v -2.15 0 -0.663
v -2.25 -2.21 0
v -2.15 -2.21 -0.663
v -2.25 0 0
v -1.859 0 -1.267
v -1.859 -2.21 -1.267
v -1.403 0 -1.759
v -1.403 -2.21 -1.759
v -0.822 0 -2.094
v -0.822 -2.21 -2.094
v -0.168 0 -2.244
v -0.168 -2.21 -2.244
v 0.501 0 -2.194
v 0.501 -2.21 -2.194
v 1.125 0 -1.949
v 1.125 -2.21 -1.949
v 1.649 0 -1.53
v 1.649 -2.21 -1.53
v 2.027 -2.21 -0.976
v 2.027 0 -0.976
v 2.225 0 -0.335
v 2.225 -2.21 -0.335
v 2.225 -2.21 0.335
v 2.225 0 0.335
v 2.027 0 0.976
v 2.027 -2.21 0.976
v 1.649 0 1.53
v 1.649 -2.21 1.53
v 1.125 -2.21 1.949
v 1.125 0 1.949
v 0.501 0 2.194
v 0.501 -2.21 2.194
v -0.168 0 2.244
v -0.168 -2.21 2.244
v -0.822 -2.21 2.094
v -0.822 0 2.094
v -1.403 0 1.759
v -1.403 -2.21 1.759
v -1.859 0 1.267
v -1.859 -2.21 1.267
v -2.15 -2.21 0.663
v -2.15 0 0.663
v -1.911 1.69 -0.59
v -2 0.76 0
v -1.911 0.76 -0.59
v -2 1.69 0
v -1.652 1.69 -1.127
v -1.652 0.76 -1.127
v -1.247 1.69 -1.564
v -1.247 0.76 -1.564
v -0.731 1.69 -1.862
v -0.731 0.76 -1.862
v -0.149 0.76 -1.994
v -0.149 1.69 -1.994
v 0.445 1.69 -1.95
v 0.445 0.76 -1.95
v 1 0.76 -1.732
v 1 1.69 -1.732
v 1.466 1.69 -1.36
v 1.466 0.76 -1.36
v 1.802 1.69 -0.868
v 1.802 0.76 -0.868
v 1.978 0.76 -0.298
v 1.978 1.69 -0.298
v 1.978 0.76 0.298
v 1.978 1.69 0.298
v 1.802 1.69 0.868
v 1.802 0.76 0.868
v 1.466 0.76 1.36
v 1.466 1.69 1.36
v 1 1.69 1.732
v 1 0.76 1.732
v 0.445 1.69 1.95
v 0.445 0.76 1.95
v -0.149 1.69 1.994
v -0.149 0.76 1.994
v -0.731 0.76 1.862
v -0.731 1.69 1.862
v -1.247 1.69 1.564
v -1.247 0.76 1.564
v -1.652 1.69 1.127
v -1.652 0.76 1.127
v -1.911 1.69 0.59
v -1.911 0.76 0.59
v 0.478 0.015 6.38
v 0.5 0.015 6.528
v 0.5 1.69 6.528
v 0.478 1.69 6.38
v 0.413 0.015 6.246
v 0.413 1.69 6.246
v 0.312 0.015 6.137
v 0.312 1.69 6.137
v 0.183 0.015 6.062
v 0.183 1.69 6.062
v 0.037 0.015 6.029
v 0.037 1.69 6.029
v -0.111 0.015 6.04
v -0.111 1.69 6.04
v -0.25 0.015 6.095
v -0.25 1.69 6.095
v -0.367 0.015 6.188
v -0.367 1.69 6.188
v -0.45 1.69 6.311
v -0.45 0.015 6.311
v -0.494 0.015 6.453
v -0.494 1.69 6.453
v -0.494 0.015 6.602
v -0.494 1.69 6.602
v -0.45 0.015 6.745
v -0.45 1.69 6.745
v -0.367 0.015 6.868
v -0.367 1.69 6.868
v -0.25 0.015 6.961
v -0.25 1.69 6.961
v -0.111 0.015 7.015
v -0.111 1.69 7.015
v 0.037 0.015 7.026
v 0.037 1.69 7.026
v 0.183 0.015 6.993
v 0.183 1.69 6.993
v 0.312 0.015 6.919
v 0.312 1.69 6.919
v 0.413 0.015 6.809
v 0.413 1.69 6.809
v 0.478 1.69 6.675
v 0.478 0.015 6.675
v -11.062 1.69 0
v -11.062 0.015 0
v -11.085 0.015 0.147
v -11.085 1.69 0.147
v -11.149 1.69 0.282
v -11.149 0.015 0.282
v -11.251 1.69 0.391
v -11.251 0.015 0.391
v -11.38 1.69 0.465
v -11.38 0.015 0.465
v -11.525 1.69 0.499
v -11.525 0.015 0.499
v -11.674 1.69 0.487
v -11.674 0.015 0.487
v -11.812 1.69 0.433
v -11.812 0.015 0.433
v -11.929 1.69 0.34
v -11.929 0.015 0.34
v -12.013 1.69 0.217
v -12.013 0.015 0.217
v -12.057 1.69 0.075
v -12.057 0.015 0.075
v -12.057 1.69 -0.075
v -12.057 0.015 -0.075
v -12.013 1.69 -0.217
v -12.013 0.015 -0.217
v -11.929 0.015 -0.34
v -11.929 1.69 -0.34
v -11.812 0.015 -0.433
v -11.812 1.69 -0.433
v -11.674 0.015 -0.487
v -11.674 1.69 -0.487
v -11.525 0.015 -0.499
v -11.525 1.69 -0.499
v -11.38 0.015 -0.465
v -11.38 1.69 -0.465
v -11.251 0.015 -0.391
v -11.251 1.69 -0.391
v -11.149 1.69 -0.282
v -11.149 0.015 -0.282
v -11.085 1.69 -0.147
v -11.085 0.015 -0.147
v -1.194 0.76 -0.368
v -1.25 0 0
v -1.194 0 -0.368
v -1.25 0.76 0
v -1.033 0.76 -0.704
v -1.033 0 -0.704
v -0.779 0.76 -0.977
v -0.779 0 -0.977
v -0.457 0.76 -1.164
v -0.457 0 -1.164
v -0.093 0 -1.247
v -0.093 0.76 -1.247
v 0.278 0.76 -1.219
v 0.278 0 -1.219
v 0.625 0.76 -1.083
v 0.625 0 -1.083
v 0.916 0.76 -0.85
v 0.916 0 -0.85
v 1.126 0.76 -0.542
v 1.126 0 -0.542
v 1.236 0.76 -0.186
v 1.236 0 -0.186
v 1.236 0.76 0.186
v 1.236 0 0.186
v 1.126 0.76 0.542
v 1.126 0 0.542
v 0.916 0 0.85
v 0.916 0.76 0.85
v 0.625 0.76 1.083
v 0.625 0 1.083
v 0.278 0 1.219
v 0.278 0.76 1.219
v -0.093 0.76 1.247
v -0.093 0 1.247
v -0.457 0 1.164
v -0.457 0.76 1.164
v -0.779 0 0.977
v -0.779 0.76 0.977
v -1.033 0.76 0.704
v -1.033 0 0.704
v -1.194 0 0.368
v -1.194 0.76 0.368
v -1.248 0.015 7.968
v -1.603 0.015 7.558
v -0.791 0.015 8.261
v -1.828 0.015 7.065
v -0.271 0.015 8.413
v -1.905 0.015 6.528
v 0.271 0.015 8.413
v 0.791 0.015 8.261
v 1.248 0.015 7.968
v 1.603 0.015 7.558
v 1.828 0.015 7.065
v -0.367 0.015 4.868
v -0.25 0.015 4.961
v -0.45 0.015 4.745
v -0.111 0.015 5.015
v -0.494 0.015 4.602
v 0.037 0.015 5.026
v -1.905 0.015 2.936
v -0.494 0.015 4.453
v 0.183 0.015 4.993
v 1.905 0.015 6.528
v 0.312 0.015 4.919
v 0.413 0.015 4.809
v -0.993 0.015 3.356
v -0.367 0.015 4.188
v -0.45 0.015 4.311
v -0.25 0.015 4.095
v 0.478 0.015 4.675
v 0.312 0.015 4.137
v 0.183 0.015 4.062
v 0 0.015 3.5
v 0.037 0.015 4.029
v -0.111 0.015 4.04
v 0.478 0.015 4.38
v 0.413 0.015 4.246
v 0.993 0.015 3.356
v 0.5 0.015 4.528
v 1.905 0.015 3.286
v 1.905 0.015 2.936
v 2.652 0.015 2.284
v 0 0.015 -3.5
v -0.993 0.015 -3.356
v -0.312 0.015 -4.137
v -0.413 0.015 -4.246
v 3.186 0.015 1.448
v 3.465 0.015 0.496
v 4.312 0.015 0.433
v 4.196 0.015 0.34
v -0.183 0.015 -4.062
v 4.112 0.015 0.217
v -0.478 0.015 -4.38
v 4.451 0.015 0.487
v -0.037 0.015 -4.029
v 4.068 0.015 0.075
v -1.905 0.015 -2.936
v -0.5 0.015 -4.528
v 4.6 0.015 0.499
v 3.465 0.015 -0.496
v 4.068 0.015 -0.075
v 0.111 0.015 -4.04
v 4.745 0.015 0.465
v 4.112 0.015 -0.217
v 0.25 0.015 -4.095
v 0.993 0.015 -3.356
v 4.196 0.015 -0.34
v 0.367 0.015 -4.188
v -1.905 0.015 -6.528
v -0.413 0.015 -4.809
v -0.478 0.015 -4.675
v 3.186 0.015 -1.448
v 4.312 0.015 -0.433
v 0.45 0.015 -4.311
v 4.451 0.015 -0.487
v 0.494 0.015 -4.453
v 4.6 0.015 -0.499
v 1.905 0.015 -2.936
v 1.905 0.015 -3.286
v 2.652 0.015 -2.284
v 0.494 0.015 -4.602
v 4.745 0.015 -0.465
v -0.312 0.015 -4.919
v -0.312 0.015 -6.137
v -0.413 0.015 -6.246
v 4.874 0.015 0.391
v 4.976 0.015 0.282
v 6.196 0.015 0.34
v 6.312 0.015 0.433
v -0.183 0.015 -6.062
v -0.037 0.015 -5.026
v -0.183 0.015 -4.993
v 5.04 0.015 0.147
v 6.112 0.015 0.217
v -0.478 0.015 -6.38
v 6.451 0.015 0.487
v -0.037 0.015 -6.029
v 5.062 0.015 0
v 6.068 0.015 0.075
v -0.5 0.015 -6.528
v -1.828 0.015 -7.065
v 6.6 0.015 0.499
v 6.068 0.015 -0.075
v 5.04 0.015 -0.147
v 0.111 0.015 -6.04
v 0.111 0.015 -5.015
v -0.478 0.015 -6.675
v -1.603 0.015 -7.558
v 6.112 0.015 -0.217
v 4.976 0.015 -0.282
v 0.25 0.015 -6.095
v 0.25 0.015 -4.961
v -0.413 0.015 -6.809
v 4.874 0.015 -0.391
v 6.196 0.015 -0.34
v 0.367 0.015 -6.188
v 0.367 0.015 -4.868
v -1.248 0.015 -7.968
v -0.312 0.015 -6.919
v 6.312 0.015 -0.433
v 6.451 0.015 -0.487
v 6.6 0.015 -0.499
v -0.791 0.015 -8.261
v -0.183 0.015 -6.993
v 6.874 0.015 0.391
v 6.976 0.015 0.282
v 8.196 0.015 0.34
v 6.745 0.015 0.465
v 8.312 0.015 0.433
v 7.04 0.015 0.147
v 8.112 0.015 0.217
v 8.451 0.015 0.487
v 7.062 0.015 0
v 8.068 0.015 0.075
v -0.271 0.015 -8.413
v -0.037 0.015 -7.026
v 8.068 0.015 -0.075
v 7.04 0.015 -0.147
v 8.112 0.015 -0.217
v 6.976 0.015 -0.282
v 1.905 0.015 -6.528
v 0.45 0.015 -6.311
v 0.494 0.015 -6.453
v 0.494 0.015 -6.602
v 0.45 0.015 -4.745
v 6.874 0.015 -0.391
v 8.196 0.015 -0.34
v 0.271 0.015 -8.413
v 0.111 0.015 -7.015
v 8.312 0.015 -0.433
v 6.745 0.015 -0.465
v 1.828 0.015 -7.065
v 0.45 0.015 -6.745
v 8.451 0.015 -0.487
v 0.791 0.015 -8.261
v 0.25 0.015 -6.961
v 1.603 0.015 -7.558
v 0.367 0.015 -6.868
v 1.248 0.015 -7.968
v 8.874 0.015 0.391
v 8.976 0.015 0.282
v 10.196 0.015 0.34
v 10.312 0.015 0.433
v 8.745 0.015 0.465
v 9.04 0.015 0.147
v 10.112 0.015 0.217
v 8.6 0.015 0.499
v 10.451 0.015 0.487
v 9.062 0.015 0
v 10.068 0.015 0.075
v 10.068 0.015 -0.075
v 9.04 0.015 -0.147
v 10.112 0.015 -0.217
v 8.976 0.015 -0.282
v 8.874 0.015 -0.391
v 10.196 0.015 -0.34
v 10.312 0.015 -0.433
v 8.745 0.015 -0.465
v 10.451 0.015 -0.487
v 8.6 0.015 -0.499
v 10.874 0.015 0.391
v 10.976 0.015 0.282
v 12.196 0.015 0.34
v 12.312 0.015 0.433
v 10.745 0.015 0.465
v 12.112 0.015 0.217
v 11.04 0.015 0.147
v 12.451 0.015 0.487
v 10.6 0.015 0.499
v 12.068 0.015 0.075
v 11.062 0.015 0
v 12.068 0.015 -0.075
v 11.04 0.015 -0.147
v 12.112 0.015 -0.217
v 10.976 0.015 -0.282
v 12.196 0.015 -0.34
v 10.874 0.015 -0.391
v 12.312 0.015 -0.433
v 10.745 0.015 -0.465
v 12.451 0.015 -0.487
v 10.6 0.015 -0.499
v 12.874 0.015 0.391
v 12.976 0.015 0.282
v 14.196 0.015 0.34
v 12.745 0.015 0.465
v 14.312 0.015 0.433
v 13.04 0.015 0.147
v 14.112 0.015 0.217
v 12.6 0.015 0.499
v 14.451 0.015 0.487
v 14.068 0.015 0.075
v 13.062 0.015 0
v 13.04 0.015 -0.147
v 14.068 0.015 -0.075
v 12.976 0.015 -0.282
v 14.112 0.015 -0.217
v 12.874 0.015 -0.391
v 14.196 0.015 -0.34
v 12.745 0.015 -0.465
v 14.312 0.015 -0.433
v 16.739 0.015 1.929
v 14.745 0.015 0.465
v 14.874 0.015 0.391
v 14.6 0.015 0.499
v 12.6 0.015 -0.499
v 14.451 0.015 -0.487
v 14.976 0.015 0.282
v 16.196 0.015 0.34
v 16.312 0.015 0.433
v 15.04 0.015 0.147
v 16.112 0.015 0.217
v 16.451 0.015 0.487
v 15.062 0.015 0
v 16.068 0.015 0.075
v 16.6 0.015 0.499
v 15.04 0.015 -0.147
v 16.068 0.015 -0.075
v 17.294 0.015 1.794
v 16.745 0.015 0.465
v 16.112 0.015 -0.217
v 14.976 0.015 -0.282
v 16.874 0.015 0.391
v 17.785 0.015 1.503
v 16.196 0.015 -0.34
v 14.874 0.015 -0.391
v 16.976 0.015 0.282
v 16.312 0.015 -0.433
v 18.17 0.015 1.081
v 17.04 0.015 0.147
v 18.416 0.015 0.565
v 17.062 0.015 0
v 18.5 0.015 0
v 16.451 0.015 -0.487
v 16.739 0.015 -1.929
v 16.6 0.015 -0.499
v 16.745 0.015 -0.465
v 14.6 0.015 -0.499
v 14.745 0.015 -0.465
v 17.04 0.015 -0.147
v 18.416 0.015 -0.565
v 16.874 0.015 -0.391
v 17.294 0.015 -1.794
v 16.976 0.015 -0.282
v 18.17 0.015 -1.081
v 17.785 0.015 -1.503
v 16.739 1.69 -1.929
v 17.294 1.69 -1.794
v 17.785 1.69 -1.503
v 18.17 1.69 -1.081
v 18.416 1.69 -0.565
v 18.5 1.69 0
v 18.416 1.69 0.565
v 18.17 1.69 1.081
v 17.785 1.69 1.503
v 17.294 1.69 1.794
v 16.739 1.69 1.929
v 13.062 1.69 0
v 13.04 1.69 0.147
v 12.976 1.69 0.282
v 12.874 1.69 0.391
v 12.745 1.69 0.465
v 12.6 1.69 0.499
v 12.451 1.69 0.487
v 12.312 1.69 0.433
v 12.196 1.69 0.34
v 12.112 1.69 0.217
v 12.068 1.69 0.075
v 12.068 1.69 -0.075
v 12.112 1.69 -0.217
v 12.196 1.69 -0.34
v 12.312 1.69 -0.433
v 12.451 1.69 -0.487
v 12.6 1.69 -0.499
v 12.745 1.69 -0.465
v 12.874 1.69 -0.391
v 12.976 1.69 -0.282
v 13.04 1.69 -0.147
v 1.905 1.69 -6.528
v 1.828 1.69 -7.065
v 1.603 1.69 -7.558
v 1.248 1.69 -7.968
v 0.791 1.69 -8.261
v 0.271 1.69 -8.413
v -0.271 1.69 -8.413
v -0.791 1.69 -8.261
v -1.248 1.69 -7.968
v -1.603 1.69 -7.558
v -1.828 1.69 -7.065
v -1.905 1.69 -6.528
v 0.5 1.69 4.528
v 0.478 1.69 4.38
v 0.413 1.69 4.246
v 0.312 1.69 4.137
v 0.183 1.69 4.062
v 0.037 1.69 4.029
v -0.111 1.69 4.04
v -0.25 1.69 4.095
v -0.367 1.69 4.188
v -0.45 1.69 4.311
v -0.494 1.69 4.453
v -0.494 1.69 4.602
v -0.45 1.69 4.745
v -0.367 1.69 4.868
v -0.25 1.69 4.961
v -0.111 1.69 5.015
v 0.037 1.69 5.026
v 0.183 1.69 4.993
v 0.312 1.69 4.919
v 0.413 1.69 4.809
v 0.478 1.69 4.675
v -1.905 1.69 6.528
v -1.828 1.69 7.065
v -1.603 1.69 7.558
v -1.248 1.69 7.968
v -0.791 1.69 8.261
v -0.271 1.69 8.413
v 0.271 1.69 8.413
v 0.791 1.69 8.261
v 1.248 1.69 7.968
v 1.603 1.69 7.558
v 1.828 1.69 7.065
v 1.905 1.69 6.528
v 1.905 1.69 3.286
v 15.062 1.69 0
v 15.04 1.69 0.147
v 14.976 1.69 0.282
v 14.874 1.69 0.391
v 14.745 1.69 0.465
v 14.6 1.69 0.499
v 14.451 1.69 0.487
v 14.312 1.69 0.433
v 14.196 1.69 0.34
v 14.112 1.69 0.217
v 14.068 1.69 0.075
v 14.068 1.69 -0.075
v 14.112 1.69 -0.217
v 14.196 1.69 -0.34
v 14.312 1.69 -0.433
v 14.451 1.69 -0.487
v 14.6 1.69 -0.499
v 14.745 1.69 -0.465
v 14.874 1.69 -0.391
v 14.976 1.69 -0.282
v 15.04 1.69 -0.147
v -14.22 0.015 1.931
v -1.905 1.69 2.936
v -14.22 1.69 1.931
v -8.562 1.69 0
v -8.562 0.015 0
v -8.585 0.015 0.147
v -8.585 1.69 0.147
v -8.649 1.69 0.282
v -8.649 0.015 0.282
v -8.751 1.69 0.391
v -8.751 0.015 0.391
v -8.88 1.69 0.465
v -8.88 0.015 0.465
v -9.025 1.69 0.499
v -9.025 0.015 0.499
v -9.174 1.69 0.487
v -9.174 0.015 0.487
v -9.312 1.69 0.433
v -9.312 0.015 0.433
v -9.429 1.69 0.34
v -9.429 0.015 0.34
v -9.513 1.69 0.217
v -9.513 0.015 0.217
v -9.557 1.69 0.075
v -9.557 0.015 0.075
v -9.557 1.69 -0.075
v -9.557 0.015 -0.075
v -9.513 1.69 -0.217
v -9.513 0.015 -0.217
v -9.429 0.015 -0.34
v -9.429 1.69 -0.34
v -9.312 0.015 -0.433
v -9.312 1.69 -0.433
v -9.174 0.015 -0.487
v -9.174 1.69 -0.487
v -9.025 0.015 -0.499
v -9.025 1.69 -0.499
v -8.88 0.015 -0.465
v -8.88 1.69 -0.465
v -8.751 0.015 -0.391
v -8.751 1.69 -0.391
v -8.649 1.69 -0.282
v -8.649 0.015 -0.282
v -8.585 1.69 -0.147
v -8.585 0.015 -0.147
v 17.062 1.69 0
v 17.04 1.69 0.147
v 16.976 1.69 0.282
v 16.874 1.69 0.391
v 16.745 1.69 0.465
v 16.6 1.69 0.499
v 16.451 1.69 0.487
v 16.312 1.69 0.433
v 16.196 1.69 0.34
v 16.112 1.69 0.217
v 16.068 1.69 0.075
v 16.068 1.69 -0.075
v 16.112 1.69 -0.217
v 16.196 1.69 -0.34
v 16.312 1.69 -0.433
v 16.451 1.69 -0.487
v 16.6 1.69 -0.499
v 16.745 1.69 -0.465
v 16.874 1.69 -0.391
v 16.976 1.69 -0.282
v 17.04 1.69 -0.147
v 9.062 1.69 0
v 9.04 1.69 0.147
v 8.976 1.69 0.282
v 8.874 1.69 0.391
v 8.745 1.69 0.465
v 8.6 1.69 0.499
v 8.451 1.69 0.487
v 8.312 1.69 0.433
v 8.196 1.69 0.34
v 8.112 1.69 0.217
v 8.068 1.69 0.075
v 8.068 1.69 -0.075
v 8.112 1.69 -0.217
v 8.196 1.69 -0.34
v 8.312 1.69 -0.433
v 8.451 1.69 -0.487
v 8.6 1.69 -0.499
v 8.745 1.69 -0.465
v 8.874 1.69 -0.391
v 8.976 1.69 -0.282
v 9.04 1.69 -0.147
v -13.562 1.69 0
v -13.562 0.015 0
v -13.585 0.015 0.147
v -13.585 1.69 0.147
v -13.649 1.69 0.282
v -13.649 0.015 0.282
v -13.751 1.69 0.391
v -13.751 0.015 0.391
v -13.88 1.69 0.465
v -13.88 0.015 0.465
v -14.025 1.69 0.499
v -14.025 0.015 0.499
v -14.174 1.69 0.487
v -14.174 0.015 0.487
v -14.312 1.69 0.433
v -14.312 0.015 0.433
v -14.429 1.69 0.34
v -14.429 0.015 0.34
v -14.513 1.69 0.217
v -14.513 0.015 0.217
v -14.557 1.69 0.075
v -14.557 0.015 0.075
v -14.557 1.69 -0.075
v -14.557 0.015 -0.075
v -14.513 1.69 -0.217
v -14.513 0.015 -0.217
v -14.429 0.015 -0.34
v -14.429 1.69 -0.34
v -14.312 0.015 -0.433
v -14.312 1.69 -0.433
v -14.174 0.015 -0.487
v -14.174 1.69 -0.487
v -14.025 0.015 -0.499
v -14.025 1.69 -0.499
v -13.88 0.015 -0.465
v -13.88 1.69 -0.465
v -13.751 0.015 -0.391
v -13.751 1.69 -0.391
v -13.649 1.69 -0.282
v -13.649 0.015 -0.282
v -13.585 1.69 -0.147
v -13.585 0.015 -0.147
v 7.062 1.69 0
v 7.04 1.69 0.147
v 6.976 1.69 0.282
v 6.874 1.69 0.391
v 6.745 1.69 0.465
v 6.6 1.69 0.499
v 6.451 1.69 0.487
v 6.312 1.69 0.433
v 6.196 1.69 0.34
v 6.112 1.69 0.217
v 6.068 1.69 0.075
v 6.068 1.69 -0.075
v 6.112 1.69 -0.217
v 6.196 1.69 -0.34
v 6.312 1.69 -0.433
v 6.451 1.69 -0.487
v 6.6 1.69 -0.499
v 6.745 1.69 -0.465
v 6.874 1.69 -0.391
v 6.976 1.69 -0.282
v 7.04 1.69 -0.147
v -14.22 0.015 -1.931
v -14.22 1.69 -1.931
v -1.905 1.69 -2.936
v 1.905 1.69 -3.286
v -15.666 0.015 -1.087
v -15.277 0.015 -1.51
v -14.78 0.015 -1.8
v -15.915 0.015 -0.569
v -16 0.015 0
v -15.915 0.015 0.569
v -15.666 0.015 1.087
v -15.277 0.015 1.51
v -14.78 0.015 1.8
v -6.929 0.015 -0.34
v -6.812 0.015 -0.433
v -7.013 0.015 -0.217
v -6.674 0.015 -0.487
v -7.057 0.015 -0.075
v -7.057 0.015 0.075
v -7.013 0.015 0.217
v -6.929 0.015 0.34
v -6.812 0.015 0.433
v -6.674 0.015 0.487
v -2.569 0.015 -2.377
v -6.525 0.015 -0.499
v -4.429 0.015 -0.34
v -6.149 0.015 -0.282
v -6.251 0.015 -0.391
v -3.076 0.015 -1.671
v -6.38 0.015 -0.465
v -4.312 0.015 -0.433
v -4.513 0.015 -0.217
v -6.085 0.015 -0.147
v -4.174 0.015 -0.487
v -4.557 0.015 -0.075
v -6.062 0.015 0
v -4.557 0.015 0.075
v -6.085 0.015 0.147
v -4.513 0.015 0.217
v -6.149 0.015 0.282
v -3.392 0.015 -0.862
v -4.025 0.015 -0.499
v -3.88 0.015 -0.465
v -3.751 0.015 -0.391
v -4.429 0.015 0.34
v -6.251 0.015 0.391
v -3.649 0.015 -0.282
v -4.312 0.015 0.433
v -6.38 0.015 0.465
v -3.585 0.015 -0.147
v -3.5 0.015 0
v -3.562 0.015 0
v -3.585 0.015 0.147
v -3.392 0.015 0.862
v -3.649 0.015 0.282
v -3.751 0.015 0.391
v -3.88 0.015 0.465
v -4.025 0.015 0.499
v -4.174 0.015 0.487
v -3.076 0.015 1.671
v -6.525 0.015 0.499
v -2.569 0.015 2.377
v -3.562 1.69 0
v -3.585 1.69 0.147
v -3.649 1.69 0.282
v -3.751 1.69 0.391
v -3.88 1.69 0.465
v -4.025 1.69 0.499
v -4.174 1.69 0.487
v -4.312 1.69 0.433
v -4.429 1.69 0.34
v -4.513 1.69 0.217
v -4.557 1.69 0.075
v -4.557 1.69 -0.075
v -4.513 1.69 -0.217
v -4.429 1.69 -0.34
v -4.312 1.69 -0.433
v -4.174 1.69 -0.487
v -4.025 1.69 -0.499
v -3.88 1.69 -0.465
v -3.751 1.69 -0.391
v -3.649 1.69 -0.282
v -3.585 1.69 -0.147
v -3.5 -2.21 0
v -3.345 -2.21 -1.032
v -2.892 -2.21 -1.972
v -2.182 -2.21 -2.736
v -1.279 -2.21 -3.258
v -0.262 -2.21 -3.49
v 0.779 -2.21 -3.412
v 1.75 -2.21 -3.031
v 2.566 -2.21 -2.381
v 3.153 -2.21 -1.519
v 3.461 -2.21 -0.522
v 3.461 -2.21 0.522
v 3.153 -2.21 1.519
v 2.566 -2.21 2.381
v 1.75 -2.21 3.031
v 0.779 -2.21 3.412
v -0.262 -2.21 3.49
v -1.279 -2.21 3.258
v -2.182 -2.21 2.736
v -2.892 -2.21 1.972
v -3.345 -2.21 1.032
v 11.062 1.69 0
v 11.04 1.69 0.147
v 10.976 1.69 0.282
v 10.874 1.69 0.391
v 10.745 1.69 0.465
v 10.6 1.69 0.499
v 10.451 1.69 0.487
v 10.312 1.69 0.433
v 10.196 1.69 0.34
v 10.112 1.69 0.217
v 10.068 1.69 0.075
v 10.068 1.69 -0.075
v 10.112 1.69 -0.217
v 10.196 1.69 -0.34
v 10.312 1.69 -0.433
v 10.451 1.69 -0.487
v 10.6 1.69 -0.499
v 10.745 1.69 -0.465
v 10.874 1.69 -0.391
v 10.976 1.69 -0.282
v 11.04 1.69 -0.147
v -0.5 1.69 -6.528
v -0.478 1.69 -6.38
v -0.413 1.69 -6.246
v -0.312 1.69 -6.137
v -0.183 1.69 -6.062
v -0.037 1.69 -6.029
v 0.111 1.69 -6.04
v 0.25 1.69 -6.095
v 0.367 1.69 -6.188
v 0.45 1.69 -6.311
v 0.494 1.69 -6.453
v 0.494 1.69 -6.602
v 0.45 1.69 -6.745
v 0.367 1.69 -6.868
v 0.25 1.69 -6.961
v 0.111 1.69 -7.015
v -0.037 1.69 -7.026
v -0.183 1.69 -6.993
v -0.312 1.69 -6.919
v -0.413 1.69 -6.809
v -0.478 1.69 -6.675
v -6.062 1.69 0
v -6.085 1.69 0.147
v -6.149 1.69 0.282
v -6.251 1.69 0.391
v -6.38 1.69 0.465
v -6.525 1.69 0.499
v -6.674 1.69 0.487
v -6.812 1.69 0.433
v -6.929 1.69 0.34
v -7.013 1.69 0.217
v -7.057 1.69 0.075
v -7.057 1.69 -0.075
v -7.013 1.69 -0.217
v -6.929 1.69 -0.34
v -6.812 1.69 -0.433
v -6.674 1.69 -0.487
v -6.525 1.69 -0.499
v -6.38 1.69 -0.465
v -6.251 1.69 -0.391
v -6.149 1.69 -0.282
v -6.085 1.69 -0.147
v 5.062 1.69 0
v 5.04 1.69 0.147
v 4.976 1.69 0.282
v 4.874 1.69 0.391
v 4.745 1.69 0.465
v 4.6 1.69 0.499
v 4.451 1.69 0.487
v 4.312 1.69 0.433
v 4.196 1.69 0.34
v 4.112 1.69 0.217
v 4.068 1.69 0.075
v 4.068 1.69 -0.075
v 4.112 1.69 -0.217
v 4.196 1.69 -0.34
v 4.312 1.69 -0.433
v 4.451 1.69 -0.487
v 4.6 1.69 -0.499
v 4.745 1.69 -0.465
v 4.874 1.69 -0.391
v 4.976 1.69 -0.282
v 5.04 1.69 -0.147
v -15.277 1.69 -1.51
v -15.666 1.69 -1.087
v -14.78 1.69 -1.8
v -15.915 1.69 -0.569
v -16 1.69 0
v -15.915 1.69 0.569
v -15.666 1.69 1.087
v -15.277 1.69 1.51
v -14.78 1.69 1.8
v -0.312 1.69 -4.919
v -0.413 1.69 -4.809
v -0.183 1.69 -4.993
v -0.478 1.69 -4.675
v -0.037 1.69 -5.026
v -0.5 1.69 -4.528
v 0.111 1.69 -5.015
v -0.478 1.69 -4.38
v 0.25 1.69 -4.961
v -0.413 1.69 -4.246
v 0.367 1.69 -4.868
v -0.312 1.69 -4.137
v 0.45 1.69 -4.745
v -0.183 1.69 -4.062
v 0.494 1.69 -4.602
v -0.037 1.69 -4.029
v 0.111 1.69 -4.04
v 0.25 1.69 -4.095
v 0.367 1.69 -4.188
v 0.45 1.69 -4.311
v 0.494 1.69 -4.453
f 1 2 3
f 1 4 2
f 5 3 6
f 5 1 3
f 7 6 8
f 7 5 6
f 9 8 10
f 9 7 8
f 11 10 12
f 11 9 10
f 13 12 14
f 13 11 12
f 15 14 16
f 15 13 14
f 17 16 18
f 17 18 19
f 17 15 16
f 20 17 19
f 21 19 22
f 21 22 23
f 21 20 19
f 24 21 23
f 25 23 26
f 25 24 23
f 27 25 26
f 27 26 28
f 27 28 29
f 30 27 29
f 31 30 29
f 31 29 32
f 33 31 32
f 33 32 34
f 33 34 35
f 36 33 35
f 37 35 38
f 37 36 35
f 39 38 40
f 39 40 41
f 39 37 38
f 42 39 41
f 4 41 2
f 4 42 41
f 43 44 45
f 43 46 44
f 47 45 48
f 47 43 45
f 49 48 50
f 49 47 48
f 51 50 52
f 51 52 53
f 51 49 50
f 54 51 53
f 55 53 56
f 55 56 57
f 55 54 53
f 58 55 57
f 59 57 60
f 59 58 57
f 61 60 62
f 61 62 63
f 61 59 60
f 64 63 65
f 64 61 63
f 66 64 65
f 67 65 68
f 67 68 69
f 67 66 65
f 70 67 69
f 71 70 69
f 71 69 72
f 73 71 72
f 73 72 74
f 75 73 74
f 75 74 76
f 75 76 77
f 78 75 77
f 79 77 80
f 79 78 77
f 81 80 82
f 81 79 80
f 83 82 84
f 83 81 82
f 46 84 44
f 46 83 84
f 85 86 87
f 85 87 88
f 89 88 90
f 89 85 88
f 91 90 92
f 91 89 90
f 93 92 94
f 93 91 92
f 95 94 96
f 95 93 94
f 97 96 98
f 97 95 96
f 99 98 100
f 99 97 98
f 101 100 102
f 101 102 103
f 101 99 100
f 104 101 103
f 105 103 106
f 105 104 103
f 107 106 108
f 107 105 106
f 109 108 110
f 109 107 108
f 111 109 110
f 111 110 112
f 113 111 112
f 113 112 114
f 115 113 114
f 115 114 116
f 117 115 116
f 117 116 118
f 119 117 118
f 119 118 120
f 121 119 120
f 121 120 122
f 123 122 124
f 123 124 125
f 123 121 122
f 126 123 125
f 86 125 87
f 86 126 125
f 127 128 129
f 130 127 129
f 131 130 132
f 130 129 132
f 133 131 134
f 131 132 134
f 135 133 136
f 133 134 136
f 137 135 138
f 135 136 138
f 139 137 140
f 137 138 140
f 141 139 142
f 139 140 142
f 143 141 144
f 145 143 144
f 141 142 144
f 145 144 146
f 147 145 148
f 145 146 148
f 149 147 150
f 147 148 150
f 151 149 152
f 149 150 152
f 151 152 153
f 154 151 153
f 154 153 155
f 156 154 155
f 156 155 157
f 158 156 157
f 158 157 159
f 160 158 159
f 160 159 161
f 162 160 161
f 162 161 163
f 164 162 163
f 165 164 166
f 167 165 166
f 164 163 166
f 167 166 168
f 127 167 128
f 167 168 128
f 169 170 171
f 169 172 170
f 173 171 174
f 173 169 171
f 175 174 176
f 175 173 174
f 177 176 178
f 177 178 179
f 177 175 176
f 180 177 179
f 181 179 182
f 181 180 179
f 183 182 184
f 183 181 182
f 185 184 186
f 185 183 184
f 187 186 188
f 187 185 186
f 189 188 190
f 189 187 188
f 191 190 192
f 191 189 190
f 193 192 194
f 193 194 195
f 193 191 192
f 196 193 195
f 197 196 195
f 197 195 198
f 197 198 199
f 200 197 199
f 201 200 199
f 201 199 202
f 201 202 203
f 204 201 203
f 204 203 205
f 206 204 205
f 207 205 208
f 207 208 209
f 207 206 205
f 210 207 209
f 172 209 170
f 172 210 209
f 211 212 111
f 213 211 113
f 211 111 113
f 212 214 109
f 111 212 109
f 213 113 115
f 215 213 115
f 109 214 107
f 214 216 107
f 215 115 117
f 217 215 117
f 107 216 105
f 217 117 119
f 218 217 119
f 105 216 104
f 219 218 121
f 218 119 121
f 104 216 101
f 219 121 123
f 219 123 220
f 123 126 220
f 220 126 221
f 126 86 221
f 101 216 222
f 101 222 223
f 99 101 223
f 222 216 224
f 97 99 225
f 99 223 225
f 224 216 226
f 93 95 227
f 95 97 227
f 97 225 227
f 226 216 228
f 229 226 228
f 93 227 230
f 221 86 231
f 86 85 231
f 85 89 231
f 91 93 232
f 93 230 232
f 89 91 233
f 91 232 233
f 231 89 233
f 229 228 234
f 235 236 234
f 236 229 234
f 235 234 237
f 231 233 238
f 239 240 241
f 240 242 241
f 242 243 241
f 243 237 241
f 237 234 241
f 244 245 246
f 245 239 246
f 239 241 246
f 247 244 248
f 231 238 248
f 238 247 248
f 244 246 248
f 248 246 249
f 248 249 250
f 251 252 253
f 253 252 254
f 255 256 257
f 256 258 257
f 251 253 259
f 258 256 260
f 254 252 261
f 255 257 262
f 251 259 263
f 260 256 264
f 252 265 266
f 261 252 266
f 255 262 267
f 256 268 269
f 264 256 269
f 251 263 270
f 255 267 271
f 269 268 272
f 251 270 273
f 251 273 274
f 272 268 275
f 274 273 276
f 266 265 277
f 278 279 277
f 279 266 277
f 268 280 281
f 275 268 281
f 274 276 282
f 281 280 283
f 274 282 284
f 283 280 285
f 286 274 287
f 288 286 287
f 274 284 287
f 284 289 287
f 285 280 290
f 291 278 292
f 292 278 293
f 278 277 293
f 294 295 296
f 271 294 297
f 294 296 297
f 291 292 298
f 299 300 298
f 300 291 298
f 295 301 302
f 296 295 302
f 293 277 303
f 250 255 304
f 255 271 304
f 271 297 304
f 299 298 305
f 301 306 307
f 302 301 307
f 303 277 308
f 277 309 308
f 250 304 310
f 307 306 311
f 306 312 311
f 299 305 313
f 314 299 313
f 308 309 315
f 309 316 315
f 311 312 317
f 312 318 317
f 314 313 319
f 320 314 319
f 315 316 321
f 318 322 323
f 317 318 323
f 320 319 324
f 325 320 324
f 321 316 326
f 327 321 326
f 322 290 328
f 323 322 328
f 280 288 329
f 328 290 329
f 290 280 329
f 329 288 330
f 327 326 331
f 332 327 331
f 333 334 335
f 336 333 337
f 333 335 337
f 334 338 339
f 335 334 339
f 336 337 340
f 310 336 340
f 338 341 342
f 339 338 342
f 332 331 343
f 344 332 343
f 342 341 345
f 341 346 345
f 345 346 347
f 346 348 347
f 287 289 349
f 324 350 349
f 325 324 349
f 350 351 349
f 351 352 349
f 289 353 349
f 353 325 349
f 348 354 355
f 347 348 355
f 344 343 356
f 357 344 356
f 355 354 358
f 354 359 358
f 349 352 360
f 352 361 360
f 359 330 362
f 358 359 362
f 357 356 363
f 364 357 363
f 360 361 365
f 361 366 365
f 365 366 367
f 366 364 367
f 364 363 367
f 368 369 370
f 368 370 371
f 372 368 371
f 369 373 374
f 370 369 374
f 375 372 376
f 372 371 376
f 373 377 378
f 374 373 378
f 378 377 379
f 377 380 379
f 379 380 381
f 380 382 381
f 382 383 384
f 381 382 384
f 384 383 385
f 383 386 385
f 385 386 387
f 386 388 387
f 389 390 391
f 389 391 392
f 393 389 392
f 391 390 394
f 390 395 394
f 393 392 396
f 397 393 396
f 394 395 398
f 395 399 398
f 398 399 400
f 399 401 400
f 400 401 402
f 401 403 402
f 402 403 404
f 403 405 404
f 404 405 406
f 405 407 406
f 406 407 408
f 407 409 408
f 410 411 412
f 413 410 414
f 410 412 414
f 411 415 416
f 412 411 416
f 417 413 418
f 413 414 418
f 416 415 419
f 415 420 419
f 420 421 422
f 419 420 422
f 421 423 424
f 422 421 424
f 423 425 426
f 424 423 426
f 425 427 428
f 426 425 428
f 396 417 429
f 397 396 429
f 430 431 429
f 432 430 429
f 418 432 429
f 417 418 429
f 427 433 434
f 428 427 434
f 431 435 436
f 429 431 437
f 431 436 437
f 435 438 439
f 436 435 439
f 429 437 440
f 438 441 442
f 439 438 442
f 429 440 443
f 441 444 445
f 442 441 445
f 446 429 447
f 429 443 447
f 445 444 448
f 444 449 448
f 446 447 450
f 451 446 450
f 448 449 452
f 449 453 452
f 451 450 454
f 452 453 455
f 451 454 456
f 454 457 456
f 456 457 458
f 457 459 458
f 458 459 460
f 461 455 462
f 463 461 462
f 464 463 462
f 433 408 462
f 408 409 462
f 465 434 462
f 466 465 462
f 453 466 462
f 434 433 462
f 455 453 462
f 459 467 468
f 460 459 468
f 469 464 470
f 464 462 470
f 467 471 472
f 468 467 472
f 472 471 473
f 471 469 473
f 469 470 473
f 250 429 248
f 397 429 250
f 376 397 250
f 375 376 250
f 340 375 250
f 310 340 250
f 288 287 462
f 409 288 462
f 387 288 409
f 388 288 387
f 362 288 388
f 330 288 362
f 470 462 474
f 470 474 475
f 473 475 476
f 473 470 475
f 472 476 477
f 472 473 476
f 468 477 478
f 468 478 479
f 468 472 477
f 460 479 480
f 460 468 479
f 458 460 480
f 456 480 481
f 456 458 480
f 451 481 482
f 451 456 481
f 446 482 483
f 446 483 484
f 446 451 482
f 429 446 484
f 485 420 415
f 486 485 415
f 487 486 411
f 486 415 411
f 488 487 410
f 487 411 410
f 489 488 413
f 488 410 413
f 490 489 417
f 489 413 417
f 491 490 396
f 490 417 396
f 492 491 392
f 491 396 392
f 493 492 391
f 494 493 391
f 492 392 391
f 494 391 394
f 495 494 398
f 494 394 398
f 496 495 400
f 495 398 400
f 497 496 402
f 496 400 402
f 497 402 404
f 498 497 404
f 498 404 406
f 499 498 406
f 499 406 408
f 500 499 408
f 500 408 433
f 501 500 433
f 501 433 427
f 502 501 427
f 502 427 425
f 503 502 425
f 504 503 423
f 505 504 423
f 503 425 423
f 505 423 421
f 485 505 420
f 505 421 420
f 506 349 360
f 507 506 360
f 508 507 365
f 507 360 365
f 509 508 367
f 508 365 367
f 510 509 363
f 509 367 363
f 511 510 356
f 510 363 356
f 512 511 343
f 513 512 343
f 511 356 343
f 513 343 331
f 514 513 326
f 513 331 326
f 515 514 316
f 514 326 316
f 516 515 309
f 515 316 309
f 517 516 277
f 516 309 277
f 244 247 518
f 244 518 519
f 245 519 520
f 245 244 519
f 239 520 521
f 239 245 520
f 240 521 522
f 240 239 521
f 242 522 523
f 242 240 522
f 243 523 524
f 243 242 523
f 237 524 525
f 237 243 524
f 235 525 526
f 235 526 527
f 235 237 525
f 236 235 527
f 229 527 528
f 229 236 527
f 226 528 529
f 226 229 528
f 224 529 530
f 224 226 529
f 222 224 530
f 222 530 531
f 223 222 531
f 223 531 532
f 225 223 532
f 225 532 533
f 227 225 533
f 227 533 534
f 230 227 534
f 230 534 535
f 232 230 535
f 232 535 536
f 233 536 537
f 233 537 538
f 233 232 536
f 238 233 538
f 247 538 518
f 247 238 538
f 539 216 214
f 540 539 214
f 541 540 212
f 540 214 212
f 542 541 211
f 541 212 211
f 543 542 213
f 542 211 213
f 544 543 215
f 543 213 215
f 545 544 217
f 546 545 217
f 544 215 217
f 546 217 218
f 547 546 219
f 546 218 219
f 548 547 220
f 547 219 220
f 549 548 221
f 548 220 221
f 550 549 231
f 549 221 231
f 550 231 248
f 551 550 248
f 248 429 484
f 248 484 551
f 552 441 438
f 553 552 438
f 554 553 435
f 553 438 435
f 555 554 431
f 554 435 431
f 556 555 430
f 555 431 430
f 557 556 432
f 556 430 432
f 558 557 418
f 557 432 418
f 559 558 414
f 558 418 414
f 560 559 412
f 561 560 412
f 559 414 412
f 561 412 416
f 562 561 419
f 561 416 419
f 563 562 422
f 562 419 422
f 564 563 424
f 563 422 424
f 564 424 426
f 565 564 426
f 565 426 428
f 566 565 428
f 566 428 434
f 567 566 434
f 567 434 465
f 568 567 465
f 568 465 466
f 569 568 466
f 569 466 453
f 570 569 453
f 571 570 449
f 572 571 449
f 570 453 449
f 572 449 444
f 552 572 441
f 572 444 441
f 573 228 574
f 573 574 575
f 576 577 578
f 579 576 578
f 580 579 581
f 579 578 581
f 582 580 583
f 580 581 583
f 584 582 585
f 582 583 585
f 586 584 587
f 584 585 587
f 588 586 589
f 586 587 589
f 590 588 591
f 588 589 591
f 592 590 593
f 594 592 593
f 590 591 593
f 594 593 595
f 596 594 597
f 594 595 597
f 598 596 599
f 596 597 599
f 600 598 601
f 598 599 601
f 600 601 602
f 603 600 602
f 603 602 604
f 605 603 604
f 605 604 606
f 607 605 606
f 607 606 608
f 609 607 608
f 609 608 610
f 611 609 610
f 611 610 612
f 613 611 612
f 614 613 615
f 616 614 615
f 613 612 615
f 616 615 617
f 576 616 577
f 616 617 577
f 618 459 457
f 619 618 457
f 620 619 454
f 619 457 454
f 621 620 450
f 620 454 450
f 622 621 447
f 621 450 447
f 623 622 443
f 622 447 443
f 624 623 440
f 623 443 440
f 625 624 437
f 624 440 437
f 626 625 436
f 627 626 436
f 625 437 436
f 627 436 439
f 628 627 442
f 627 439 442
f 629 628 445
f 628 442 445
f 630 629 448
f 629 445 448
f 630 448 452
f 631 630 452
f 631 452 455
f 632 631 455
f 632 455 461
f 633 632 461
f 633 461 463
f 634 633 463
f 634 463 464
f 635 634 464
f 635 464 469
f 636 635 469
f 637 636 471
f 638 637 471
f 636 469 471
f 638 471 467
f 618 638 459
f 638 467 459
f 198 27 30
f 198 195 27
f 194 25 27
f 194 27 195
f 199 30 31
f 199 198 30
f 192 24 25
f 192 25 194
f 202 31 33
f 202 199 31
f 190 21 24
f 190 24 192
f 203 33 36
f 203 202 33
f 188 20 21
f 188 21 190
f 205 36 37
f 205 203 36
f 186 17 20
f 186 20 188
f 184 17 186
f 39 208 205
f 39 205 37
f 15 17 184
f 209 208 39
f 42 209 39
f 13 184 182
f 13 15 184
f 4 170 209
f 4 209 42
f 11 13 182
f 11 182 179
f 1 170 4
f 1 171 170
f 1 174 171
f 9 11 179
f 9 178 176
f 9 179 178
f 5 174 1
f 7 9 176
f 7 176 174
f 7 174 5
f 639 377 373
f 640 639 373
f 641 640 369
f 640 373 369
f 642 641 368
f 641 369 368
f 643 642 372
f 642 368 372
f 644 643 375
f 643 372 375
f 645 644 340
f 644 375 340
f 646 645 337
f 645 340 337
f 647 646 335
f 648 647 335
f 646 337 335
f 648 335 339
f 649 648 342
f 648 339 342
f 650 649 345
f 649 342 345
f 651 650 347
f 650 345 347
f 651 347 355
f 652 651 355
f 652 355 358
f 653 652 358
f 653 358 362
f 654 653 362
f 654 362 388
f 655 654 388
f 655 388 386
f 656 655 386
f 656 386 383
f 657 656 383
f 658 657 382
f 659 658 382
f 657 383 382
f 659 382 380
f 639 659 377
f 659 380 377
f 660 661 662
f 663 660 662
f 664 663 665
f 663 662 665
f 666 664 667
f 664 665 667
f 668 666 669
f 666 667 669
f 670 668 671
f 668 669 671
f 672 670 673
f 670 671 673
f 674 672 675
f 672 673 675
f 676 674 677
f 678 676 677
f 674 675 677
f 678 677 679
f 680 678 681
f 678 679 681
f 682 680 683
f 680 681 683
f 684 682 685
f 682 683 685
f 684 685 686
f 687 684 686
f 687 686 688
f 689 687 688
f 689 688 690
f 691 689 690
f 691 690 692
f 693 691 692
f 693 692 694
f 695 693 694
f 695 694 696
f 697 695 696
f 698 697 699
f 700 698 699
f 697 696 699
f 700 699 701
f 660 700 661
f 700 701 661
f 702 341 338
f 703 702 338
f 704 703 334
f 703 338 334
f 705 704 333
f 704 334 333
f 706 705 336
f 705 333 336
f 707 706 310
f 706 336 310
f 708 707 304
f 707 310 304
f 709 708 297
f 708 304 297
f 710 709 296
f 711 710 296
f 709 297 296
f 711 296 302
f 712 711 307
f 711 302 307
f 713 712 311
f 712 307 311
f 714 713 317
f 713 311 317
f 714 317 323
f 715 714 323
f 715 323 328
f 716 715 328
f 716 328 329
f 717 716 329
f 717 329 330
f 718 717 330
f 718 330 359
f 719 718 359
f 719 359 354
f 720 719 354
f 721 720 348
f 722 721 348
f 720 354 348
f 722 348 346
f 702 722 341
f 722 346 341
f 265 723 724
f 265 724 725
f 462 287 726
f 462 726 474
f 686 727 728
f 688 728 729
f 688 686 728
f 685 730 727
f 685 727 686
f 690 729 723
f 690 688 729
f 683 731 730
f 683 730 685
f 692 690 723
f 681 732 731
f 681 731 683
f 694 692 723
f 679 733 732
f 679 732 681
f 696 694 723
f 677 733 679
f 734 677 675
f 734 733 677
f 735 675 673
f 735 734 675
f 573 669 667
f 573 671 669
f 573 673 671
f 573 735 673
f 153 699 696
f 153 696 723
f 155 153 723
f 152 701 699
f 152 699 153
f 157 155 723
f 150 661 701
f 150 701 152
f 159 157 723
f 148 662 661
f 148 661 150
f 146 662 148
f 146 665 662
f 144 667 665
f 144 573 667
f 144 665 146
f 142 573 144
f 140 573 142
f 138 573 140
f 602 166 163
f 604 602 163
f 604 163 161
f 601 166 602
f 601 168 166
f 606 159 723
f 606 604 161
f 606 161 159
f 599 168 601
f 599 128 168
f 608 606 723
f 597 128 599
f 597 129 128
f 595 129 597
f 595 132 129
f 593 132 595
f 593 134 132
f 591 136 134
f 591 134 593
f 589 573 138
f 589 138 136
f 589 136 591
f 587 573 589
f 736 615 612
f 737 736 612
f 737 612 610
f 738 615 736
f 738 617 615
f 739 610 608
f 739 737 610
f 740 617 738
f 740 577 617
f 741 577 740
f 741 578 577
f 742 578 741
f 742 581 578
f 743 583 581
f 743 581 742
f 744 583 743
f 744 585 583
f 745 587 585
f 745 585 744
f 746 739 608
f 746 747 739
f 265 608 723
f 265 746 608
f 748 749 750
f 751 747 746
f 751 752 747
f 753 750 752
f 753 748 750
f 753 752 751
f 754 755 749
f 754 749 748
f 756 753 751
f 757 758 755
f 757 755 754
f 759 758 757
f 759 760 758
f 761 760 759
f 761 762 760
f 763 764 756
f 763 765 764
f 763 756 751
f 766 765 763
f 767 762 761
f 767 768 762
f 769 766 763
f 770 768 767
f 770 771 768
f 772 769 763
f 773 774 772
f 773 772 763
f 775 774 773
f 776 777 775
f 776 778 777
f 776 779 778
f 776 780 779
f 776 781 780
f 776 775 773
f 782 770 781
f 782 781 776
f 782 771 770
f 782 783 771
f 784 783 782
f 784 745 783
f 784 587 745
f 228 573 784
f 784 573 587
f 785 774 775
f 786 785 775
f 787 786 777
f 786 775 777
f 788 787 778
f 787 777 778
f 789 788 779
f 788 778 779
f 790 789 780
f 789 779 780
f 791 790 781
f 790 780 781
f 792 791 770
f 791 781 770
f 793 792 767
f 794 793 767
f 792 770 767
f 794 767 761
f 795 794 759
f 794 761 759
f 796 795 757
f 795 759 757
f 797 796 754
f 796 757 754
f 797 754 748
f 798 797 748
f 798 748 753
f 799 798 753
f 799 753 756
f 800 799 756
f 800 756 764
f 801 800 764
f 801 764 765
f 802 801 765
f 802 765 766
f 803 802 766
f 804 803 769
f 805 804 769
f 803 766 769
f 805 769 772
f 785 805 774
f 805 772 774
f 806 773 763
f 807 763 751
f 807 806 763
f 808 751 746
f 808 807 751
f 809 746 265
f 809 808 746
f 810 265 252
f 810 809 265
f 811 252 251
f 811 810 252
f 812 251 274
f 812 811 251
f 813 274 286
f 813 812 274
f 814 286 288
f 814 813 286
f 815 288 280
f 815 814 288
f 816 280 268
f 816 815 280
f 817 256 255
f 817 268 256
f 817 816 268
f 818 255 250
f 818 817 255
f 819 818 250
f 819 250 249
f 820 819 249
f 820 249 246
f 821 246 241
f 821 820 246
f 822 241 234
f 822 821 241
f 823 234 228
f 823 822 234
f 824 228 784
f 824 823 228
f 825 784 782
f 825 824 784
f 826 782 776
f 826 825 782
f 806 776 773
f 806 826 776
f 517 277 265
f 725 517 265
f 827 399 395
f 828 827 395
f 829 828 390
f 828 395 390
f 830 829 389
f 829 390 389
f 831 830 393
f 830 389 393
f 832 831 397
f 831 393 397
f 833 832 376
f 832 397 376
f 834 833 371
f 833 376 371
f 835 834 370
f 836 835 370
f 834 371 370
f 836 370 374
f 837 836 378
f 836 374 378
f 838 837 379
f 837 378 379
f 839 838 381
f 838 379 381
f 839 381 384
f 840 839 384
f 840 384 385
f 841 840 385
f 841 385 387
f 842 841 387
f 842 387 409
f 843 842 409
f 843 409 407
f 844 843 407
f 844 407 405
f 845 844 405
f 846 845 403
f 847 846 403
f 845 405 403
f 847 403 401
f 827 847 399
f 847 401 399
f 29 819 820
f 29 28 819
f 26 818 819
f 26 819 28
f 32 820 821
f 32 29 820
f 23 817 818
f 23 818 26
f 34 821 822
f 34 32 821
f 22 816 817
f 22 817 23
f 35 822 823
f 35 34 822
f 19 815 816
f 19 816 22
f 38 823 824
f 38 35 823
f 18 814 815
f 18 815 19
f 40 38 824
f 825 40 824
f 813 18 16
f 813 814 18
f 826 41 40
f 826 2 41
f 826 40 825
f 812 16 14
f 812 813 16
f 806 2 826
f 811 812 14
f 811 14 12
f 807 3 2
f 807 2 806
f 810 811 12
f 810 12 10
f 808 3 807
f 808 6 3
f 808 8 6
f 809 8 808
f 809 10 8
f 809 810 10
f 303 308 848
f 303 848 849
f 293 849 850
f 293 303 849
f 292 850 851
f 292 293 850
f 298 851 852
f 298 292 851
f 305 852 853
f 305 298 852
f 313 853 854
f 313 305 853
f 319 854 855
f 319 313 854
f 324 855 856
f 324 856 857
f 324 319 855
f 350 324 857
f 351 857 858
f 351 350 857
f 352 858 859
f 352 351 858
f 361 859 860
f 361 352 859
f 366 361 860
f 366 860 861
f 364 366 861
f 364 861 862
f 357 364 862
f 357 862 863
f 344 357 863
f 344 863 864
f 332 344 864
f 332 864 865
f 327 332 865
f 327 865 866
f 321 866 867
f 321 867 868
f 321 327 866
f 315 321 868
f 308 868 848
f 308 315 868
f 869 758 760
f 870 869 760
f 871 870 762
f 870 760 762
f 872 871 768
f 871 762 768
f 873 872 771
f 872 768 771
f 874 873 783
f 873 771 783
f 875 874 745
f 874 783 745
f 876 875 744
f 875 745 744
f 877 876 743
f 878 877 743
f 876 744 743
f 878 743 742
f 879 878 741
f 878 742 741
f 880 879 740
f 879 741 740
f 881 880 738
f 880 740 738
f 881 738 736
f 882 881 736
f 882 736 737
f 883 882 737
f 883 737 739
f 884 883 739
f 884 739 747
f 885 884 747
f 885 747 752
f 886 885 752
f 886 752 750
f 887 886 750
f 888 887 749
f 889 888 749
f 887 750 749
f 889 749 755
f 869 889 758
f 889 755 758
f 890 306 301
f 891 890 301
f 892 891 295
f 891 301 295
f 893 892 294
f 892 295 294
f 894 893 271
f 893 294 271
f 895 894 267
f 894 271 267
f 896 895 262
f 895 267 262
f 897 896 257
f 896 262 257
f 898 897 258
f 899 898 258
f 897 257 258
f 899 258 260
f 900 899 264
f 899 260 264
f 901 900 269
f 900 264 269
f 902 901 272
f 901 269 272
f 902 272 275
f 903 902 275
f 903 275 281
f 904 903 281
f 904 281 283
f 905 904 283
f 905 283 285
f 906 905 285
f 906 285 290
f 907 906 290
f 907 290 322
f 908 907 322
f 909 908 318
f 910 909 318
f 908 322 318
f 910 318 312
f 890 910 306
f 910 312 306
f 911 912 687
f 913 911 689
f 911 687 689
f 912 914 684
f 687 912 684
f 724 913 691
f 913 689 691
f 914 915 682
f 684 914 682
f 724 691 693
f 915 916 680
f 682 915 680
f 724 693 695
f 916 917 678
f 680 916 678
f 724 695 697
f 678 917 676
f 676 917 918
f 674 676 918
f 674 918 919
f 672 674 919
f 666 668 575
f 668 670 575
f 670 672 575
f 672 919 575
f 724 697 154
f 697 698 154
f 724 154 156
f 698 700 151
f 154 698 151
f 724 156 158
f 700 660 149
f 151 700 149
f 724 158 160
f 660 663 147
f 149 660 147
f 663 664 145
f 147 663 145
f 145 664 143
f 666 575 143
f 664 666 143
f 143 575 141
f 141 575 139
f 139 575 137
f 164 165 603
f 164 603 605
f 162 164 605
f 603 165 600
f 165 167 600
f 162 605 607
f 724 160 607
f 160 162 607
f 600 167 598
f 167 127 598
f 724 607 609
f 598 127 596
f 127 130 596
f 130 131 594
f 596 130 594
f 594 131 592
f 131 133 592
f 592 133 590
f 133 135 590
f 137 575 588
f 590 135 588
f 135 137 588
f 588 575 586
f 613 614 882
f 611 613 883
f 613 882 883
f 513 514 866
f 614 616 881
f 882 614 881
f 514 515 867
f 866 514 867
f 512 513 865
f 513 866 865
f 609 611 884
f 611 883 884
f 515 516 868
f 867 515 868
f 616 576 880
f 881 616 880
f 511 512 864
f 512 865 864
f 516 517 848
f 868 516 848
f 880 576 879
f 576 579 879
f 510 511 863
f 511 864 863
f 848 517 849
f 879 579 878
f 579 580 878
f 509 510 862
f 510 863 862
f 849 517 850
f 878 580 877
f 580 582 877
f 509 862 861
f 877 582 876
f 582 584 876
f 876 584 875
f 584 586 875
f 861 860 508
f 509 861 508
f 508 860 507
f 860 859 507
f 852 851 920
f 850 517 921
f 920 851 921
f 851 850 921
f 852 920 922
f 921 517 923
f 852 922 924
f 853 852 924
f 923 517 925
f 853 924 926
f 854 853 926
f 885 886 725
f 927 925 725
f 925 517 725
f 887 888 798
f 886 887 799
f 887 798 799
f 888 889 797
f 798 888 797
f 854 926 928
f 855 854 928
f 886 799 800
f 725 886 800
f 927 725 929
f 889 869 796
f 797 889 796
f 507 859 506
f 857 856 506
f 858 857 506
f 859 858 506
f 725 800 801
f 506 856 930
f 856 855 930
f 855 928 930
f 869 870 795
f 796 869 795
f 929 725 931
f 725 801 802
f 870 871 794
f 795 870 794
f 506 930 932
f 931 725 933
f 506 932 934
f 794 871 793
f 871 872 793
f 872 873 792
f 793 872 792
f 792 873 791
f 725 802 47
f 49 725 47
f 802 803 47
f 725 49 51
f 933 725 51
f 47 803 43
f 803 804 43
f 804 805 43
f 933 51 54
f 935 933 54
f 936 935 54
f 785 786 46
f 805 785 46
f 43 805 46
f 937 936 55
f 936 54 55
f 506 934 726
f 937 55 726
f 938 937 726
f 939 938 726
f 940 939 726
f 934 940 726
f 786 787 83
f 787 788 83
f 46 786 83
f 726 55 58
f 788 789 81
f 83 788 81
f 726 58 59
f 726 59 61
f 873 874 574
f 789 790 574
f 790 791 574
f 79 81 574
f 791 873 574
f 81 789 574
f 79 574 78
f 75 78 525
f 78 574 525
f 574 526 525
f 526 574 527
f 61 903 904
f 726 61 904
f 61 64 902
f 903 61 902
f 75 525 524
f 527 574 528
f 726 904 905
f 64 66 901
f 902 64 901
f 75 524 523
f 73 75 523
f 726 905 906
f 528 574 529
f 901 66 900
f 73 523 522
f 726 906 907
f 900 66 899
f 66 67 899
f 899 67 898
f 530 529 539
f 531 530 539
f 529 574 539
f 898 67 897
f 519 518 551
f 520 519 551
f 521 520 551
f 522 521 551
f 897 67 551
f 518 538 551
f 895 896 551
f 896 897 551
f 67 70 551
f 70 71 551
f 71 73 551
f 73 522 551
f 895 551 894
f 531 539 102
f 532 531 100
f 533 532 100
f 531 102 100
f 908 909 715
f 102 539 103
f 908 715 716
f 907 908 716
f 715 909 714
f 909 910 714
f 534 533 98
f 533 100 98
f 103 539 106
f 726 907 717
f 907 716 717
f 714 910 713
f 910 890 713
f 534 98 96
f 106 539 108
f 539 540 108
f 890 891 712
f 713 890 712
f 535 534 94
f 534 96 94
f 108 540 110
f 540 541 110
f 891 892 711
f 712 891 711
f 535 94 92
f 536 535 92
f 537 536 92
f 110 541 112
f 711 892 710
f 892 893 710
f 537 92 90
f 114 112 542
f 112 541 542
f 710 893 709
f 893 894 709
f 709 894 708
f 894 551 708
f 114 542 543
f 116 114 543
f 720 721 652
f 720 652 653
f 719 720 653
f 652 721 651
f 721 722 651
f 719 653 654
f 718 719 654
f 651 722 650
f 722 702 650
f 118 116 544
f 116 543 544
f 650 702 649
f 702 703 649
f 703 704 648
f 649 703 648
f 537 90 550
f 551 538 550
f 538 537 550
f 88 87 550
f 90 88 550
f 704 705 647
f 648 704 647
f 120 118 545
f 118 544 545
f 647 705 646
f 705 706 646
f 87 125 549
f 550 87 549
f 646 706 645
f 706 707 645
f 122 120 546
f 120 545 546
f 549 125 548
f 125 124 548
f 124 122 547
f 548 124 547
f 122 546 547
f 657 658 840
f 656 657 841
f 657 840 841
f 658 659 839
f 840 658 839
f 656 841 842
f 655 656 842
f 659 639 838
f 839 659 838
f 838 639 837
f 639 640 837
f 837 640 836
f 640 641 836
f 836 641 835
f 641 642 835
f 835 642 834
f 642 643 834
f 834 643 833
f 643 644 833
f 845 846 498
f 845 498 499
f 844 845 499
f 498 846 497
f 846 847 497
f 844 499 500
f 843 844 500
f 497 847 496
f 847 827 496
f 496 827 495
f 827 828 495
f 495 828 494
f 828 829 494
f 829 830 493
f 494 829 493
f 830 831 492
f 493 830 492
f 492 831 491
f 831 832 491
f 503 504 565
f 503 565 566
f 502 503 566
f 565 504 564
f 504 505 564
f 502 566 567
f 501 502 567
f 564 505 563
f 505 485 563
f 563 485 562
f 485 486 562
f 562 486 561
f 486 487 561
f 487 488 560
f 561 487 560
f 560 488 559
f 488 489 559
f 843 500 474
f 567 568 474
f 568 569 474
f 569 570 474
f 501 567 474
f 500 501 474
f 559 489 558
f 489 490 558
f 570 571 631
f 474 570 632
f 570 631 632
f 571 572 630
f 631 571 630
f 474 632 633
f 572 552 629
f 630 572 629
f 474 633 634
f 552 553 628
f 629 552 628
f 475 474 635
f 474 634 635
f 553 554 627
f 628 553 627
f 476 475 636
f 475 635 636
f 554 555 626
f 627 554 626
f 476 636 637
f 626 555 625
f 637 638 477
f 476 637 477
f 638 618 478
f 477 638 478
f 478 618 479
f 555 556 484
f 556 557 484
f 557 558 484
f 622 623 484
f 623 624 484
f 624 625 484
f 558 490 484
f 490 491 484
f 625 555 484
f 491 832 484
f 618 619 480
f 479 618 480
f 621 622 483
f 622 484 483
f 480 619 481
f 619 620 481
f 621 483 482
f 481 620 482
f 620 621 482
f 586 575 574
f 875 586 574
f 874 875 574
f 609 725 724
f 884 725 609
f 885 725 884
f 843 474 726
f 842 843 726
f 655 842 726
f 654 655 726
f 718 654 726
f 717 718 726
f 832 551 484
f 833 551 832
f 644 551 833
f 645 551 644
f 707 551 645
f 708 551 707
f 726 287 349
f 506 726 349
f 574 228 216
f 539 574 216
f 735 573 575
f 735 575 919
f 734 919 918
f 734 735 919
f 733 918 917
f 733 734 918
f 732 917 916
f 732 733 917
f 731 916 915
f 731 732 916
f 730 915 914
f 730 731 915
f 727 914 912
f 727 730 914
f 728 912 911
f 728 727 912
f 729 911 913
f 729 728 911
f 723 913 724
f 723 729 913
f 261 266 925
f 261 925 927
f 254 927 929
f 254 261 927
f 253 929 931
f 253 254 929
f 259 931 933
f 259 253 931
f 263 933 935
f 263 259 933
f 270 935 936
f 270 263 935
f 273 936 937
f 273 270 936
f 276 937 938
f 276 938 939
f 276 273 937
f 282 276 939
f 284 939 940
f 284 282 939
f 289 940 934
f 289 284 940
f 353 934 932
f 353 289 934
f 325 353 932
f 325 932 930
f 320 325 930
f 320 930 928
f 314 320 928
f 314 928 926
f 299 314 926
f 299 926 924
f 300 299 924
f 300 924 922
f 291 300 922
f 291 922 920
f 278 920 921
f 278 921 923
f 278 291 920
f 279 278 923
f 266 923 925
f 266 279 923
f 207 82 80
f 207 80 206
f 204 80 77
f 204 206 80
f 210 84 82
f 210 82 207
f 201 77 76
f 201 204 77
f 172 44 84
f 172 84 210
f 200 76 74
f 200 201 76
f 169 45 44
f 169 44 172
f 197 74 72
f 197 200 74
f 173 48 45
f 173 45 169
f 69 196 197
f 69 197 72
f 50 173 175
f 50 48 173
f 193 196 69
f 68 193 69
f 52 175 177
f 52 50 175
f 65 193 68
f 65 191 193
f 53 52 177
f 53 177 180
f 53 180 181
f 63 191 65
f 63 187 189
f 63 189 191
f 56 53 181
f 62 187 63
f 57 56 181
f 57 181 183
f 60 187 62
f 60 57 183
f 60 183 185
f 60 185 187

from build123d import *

# Parameters (mm, degrees)
BOSS_EXTRUDE1_START = -1.675
SKETCH2_R           = 0.5
BOSS_EXTRUDE1_DEPTH = 1.675
CIRPATTERN1_COUNT   = 2
SKETCH3_R           = 0.5
BOSS_EXTRUDE2_DEPTH = 1.675
SKETCH4_R           = 0.5
BOSS_EXTRUDE3_DEPTH = 1.675


with BuildPart() as part:
    # Sketch1 → Revolve1 (revolve)
    with BuildSketch(Plane.XY, mode=Mode.PRIVATE) as revolve1_sk:
        Polygon((2.25, 0), (1.25, 0), (1.25, 0.76), (2, 0.76), (2, 1.69), (3.5, 1.69), (3.5, -2.21), (2.25, -2.21), align=None)
    revolve(revolve1_sk.sketch.rotate(Axis((0, 0, 0), (0, -1, 0)), 180), axis=Axis((0, 0, 0), (0, -1, 0)))

    # Sketch2 → Boss-Extrude1 (add)
    with BuildSketch(Plane(origin=(0, 1.69, 0), x_dir=(1, 0, 0), z_dir=(0, 1, 0)).offset(BOSS_EXTRUDE1_START)):
        with BuildLine():
            Line((-1.905, 6.5278), (-1.905, 2.93614969))
            ThreePointArc((-1.905, 2.93614969), (0, 3.5), (1.905, 2.93614969))
            Line((1.905, 2.93614969), (1.905, 6.5278))
            ThreePointArc((1.905, 6.5278), (0, 8.4328), (-1.905, 6.5278))
        make_face()
        with Locations(Location((0, 6.5278, 0), (0, 0, 180))):
            Circle(SKETCH2_R, mode=Mode.SUBTRACT)
        with Locations(Location((0, 4.5278, 0), (0, 0, 180))):
            Circle(SKETCH2_R, mode=Mode.SUBTRACT)
    boss_extrude1 = extrude(amount=BOSS_EXTRUDE1_DEPTH)

    # CirPattern1: Boss-Extrude1 ×2 about axis
    cirpattern1_axis = Axis((0, 0, 0), (0, 1, 0))
    for i in range(1, CIRPATTERN1_COUNT):
        add(boss_extrude1.rotate(cirpattern1_axis, i * 360 / CIRPATTERN1_COUNT))

    # Sketch3 → Boss-Extrude2 (add)
    with BuildSketch(Plane.XZ.offset(-0.015)):
        with BuildLine():
            Line((0.927024811, -3.375), (16.738893675, -1.929453741))
            ThreePointArc((16.738893675, -1.929453741), (18.5, 0), (16.738893675, 1.929453741))
            Line((16.738893675, 1.929453741), (0.927024811, 3.375))
            ThreePointArc((0.927024811, 3.375), (3.5, 0), (0.927024811, -3.375))
        make_face()
        with Locations((16.562499938, 0)):
            Circle(SKETCH3_R, mode=Mode.SUBTRACT)
        with Locations((14.562499938, 0)):
            Circle(SKETCH3_R, mode=Mode.SUBTRACT)
        with Locations((12.562499938, 0)):
            Circle(SKETCH3_R, mode=Mode.SUBTRACT)
        with Locations((10.562499938, 0)):
            Circle(SKETCH3_R, mode=Mode.SUBTRACT)
        with Locations((8.562499938, 0)):
            Circle(SKETCH3_R, mode=Mode.SUBTRACT)
        with Locations((6.562499938, 0)):
            Circle(SKETCH3_R, mode=Mode.SUBTRACT)
        with Locations((4.562499938, 0)):
            Circle(SKETCH3_R, mode=Mode.SUBTRACT)
    extrude(amount=-BOSS_EXTRUDE2_DEPTH)

    # Sketch4 → Boss-Extrude3 (add)
    with BuildSketch(Plane.XZ.offset(-0.015)):
        with BuildLine():
            Line((-1.905, 2.93614969), (-14.220100787, 1.931079611))
            ThreePointArc((-14.220100787, 1.931079611), (-16, 0), (-14.220100787, -1.931079611))
            Line((-14.220100787, -1.931079611), (-1.905, -2.93614969))
            ThreePointArc((-1.905, -2.93614969), (-3.5, 0), (-1.905, 2.93614969))
        make_face()
        with Locations((-14.062499938, 0)):
            Circle(SKETCH4_R, mode=Mode.SUBTRACT)
        with Locations((-11.562499938, 0)):
            Circle(SKETCH4_R, mode=Mode.SUBTRACT)
        with Locations((-9.062499938, 0)):
            Circle(SKETCH4_R, mode=Mode.SUBTRACT)
        with Locations((-6.562499938, 0)):
            Circle(SKETCH4_R, mode=Mode.SUBTRACT)
        with Locations((-4.062499938, 0)):
            Circle(SKETCH4_R, mode=Mode.SUBTRACT)
    extrude(amount=-BOSS_EXTRUDE3_DEPTH)


solid = part.part
